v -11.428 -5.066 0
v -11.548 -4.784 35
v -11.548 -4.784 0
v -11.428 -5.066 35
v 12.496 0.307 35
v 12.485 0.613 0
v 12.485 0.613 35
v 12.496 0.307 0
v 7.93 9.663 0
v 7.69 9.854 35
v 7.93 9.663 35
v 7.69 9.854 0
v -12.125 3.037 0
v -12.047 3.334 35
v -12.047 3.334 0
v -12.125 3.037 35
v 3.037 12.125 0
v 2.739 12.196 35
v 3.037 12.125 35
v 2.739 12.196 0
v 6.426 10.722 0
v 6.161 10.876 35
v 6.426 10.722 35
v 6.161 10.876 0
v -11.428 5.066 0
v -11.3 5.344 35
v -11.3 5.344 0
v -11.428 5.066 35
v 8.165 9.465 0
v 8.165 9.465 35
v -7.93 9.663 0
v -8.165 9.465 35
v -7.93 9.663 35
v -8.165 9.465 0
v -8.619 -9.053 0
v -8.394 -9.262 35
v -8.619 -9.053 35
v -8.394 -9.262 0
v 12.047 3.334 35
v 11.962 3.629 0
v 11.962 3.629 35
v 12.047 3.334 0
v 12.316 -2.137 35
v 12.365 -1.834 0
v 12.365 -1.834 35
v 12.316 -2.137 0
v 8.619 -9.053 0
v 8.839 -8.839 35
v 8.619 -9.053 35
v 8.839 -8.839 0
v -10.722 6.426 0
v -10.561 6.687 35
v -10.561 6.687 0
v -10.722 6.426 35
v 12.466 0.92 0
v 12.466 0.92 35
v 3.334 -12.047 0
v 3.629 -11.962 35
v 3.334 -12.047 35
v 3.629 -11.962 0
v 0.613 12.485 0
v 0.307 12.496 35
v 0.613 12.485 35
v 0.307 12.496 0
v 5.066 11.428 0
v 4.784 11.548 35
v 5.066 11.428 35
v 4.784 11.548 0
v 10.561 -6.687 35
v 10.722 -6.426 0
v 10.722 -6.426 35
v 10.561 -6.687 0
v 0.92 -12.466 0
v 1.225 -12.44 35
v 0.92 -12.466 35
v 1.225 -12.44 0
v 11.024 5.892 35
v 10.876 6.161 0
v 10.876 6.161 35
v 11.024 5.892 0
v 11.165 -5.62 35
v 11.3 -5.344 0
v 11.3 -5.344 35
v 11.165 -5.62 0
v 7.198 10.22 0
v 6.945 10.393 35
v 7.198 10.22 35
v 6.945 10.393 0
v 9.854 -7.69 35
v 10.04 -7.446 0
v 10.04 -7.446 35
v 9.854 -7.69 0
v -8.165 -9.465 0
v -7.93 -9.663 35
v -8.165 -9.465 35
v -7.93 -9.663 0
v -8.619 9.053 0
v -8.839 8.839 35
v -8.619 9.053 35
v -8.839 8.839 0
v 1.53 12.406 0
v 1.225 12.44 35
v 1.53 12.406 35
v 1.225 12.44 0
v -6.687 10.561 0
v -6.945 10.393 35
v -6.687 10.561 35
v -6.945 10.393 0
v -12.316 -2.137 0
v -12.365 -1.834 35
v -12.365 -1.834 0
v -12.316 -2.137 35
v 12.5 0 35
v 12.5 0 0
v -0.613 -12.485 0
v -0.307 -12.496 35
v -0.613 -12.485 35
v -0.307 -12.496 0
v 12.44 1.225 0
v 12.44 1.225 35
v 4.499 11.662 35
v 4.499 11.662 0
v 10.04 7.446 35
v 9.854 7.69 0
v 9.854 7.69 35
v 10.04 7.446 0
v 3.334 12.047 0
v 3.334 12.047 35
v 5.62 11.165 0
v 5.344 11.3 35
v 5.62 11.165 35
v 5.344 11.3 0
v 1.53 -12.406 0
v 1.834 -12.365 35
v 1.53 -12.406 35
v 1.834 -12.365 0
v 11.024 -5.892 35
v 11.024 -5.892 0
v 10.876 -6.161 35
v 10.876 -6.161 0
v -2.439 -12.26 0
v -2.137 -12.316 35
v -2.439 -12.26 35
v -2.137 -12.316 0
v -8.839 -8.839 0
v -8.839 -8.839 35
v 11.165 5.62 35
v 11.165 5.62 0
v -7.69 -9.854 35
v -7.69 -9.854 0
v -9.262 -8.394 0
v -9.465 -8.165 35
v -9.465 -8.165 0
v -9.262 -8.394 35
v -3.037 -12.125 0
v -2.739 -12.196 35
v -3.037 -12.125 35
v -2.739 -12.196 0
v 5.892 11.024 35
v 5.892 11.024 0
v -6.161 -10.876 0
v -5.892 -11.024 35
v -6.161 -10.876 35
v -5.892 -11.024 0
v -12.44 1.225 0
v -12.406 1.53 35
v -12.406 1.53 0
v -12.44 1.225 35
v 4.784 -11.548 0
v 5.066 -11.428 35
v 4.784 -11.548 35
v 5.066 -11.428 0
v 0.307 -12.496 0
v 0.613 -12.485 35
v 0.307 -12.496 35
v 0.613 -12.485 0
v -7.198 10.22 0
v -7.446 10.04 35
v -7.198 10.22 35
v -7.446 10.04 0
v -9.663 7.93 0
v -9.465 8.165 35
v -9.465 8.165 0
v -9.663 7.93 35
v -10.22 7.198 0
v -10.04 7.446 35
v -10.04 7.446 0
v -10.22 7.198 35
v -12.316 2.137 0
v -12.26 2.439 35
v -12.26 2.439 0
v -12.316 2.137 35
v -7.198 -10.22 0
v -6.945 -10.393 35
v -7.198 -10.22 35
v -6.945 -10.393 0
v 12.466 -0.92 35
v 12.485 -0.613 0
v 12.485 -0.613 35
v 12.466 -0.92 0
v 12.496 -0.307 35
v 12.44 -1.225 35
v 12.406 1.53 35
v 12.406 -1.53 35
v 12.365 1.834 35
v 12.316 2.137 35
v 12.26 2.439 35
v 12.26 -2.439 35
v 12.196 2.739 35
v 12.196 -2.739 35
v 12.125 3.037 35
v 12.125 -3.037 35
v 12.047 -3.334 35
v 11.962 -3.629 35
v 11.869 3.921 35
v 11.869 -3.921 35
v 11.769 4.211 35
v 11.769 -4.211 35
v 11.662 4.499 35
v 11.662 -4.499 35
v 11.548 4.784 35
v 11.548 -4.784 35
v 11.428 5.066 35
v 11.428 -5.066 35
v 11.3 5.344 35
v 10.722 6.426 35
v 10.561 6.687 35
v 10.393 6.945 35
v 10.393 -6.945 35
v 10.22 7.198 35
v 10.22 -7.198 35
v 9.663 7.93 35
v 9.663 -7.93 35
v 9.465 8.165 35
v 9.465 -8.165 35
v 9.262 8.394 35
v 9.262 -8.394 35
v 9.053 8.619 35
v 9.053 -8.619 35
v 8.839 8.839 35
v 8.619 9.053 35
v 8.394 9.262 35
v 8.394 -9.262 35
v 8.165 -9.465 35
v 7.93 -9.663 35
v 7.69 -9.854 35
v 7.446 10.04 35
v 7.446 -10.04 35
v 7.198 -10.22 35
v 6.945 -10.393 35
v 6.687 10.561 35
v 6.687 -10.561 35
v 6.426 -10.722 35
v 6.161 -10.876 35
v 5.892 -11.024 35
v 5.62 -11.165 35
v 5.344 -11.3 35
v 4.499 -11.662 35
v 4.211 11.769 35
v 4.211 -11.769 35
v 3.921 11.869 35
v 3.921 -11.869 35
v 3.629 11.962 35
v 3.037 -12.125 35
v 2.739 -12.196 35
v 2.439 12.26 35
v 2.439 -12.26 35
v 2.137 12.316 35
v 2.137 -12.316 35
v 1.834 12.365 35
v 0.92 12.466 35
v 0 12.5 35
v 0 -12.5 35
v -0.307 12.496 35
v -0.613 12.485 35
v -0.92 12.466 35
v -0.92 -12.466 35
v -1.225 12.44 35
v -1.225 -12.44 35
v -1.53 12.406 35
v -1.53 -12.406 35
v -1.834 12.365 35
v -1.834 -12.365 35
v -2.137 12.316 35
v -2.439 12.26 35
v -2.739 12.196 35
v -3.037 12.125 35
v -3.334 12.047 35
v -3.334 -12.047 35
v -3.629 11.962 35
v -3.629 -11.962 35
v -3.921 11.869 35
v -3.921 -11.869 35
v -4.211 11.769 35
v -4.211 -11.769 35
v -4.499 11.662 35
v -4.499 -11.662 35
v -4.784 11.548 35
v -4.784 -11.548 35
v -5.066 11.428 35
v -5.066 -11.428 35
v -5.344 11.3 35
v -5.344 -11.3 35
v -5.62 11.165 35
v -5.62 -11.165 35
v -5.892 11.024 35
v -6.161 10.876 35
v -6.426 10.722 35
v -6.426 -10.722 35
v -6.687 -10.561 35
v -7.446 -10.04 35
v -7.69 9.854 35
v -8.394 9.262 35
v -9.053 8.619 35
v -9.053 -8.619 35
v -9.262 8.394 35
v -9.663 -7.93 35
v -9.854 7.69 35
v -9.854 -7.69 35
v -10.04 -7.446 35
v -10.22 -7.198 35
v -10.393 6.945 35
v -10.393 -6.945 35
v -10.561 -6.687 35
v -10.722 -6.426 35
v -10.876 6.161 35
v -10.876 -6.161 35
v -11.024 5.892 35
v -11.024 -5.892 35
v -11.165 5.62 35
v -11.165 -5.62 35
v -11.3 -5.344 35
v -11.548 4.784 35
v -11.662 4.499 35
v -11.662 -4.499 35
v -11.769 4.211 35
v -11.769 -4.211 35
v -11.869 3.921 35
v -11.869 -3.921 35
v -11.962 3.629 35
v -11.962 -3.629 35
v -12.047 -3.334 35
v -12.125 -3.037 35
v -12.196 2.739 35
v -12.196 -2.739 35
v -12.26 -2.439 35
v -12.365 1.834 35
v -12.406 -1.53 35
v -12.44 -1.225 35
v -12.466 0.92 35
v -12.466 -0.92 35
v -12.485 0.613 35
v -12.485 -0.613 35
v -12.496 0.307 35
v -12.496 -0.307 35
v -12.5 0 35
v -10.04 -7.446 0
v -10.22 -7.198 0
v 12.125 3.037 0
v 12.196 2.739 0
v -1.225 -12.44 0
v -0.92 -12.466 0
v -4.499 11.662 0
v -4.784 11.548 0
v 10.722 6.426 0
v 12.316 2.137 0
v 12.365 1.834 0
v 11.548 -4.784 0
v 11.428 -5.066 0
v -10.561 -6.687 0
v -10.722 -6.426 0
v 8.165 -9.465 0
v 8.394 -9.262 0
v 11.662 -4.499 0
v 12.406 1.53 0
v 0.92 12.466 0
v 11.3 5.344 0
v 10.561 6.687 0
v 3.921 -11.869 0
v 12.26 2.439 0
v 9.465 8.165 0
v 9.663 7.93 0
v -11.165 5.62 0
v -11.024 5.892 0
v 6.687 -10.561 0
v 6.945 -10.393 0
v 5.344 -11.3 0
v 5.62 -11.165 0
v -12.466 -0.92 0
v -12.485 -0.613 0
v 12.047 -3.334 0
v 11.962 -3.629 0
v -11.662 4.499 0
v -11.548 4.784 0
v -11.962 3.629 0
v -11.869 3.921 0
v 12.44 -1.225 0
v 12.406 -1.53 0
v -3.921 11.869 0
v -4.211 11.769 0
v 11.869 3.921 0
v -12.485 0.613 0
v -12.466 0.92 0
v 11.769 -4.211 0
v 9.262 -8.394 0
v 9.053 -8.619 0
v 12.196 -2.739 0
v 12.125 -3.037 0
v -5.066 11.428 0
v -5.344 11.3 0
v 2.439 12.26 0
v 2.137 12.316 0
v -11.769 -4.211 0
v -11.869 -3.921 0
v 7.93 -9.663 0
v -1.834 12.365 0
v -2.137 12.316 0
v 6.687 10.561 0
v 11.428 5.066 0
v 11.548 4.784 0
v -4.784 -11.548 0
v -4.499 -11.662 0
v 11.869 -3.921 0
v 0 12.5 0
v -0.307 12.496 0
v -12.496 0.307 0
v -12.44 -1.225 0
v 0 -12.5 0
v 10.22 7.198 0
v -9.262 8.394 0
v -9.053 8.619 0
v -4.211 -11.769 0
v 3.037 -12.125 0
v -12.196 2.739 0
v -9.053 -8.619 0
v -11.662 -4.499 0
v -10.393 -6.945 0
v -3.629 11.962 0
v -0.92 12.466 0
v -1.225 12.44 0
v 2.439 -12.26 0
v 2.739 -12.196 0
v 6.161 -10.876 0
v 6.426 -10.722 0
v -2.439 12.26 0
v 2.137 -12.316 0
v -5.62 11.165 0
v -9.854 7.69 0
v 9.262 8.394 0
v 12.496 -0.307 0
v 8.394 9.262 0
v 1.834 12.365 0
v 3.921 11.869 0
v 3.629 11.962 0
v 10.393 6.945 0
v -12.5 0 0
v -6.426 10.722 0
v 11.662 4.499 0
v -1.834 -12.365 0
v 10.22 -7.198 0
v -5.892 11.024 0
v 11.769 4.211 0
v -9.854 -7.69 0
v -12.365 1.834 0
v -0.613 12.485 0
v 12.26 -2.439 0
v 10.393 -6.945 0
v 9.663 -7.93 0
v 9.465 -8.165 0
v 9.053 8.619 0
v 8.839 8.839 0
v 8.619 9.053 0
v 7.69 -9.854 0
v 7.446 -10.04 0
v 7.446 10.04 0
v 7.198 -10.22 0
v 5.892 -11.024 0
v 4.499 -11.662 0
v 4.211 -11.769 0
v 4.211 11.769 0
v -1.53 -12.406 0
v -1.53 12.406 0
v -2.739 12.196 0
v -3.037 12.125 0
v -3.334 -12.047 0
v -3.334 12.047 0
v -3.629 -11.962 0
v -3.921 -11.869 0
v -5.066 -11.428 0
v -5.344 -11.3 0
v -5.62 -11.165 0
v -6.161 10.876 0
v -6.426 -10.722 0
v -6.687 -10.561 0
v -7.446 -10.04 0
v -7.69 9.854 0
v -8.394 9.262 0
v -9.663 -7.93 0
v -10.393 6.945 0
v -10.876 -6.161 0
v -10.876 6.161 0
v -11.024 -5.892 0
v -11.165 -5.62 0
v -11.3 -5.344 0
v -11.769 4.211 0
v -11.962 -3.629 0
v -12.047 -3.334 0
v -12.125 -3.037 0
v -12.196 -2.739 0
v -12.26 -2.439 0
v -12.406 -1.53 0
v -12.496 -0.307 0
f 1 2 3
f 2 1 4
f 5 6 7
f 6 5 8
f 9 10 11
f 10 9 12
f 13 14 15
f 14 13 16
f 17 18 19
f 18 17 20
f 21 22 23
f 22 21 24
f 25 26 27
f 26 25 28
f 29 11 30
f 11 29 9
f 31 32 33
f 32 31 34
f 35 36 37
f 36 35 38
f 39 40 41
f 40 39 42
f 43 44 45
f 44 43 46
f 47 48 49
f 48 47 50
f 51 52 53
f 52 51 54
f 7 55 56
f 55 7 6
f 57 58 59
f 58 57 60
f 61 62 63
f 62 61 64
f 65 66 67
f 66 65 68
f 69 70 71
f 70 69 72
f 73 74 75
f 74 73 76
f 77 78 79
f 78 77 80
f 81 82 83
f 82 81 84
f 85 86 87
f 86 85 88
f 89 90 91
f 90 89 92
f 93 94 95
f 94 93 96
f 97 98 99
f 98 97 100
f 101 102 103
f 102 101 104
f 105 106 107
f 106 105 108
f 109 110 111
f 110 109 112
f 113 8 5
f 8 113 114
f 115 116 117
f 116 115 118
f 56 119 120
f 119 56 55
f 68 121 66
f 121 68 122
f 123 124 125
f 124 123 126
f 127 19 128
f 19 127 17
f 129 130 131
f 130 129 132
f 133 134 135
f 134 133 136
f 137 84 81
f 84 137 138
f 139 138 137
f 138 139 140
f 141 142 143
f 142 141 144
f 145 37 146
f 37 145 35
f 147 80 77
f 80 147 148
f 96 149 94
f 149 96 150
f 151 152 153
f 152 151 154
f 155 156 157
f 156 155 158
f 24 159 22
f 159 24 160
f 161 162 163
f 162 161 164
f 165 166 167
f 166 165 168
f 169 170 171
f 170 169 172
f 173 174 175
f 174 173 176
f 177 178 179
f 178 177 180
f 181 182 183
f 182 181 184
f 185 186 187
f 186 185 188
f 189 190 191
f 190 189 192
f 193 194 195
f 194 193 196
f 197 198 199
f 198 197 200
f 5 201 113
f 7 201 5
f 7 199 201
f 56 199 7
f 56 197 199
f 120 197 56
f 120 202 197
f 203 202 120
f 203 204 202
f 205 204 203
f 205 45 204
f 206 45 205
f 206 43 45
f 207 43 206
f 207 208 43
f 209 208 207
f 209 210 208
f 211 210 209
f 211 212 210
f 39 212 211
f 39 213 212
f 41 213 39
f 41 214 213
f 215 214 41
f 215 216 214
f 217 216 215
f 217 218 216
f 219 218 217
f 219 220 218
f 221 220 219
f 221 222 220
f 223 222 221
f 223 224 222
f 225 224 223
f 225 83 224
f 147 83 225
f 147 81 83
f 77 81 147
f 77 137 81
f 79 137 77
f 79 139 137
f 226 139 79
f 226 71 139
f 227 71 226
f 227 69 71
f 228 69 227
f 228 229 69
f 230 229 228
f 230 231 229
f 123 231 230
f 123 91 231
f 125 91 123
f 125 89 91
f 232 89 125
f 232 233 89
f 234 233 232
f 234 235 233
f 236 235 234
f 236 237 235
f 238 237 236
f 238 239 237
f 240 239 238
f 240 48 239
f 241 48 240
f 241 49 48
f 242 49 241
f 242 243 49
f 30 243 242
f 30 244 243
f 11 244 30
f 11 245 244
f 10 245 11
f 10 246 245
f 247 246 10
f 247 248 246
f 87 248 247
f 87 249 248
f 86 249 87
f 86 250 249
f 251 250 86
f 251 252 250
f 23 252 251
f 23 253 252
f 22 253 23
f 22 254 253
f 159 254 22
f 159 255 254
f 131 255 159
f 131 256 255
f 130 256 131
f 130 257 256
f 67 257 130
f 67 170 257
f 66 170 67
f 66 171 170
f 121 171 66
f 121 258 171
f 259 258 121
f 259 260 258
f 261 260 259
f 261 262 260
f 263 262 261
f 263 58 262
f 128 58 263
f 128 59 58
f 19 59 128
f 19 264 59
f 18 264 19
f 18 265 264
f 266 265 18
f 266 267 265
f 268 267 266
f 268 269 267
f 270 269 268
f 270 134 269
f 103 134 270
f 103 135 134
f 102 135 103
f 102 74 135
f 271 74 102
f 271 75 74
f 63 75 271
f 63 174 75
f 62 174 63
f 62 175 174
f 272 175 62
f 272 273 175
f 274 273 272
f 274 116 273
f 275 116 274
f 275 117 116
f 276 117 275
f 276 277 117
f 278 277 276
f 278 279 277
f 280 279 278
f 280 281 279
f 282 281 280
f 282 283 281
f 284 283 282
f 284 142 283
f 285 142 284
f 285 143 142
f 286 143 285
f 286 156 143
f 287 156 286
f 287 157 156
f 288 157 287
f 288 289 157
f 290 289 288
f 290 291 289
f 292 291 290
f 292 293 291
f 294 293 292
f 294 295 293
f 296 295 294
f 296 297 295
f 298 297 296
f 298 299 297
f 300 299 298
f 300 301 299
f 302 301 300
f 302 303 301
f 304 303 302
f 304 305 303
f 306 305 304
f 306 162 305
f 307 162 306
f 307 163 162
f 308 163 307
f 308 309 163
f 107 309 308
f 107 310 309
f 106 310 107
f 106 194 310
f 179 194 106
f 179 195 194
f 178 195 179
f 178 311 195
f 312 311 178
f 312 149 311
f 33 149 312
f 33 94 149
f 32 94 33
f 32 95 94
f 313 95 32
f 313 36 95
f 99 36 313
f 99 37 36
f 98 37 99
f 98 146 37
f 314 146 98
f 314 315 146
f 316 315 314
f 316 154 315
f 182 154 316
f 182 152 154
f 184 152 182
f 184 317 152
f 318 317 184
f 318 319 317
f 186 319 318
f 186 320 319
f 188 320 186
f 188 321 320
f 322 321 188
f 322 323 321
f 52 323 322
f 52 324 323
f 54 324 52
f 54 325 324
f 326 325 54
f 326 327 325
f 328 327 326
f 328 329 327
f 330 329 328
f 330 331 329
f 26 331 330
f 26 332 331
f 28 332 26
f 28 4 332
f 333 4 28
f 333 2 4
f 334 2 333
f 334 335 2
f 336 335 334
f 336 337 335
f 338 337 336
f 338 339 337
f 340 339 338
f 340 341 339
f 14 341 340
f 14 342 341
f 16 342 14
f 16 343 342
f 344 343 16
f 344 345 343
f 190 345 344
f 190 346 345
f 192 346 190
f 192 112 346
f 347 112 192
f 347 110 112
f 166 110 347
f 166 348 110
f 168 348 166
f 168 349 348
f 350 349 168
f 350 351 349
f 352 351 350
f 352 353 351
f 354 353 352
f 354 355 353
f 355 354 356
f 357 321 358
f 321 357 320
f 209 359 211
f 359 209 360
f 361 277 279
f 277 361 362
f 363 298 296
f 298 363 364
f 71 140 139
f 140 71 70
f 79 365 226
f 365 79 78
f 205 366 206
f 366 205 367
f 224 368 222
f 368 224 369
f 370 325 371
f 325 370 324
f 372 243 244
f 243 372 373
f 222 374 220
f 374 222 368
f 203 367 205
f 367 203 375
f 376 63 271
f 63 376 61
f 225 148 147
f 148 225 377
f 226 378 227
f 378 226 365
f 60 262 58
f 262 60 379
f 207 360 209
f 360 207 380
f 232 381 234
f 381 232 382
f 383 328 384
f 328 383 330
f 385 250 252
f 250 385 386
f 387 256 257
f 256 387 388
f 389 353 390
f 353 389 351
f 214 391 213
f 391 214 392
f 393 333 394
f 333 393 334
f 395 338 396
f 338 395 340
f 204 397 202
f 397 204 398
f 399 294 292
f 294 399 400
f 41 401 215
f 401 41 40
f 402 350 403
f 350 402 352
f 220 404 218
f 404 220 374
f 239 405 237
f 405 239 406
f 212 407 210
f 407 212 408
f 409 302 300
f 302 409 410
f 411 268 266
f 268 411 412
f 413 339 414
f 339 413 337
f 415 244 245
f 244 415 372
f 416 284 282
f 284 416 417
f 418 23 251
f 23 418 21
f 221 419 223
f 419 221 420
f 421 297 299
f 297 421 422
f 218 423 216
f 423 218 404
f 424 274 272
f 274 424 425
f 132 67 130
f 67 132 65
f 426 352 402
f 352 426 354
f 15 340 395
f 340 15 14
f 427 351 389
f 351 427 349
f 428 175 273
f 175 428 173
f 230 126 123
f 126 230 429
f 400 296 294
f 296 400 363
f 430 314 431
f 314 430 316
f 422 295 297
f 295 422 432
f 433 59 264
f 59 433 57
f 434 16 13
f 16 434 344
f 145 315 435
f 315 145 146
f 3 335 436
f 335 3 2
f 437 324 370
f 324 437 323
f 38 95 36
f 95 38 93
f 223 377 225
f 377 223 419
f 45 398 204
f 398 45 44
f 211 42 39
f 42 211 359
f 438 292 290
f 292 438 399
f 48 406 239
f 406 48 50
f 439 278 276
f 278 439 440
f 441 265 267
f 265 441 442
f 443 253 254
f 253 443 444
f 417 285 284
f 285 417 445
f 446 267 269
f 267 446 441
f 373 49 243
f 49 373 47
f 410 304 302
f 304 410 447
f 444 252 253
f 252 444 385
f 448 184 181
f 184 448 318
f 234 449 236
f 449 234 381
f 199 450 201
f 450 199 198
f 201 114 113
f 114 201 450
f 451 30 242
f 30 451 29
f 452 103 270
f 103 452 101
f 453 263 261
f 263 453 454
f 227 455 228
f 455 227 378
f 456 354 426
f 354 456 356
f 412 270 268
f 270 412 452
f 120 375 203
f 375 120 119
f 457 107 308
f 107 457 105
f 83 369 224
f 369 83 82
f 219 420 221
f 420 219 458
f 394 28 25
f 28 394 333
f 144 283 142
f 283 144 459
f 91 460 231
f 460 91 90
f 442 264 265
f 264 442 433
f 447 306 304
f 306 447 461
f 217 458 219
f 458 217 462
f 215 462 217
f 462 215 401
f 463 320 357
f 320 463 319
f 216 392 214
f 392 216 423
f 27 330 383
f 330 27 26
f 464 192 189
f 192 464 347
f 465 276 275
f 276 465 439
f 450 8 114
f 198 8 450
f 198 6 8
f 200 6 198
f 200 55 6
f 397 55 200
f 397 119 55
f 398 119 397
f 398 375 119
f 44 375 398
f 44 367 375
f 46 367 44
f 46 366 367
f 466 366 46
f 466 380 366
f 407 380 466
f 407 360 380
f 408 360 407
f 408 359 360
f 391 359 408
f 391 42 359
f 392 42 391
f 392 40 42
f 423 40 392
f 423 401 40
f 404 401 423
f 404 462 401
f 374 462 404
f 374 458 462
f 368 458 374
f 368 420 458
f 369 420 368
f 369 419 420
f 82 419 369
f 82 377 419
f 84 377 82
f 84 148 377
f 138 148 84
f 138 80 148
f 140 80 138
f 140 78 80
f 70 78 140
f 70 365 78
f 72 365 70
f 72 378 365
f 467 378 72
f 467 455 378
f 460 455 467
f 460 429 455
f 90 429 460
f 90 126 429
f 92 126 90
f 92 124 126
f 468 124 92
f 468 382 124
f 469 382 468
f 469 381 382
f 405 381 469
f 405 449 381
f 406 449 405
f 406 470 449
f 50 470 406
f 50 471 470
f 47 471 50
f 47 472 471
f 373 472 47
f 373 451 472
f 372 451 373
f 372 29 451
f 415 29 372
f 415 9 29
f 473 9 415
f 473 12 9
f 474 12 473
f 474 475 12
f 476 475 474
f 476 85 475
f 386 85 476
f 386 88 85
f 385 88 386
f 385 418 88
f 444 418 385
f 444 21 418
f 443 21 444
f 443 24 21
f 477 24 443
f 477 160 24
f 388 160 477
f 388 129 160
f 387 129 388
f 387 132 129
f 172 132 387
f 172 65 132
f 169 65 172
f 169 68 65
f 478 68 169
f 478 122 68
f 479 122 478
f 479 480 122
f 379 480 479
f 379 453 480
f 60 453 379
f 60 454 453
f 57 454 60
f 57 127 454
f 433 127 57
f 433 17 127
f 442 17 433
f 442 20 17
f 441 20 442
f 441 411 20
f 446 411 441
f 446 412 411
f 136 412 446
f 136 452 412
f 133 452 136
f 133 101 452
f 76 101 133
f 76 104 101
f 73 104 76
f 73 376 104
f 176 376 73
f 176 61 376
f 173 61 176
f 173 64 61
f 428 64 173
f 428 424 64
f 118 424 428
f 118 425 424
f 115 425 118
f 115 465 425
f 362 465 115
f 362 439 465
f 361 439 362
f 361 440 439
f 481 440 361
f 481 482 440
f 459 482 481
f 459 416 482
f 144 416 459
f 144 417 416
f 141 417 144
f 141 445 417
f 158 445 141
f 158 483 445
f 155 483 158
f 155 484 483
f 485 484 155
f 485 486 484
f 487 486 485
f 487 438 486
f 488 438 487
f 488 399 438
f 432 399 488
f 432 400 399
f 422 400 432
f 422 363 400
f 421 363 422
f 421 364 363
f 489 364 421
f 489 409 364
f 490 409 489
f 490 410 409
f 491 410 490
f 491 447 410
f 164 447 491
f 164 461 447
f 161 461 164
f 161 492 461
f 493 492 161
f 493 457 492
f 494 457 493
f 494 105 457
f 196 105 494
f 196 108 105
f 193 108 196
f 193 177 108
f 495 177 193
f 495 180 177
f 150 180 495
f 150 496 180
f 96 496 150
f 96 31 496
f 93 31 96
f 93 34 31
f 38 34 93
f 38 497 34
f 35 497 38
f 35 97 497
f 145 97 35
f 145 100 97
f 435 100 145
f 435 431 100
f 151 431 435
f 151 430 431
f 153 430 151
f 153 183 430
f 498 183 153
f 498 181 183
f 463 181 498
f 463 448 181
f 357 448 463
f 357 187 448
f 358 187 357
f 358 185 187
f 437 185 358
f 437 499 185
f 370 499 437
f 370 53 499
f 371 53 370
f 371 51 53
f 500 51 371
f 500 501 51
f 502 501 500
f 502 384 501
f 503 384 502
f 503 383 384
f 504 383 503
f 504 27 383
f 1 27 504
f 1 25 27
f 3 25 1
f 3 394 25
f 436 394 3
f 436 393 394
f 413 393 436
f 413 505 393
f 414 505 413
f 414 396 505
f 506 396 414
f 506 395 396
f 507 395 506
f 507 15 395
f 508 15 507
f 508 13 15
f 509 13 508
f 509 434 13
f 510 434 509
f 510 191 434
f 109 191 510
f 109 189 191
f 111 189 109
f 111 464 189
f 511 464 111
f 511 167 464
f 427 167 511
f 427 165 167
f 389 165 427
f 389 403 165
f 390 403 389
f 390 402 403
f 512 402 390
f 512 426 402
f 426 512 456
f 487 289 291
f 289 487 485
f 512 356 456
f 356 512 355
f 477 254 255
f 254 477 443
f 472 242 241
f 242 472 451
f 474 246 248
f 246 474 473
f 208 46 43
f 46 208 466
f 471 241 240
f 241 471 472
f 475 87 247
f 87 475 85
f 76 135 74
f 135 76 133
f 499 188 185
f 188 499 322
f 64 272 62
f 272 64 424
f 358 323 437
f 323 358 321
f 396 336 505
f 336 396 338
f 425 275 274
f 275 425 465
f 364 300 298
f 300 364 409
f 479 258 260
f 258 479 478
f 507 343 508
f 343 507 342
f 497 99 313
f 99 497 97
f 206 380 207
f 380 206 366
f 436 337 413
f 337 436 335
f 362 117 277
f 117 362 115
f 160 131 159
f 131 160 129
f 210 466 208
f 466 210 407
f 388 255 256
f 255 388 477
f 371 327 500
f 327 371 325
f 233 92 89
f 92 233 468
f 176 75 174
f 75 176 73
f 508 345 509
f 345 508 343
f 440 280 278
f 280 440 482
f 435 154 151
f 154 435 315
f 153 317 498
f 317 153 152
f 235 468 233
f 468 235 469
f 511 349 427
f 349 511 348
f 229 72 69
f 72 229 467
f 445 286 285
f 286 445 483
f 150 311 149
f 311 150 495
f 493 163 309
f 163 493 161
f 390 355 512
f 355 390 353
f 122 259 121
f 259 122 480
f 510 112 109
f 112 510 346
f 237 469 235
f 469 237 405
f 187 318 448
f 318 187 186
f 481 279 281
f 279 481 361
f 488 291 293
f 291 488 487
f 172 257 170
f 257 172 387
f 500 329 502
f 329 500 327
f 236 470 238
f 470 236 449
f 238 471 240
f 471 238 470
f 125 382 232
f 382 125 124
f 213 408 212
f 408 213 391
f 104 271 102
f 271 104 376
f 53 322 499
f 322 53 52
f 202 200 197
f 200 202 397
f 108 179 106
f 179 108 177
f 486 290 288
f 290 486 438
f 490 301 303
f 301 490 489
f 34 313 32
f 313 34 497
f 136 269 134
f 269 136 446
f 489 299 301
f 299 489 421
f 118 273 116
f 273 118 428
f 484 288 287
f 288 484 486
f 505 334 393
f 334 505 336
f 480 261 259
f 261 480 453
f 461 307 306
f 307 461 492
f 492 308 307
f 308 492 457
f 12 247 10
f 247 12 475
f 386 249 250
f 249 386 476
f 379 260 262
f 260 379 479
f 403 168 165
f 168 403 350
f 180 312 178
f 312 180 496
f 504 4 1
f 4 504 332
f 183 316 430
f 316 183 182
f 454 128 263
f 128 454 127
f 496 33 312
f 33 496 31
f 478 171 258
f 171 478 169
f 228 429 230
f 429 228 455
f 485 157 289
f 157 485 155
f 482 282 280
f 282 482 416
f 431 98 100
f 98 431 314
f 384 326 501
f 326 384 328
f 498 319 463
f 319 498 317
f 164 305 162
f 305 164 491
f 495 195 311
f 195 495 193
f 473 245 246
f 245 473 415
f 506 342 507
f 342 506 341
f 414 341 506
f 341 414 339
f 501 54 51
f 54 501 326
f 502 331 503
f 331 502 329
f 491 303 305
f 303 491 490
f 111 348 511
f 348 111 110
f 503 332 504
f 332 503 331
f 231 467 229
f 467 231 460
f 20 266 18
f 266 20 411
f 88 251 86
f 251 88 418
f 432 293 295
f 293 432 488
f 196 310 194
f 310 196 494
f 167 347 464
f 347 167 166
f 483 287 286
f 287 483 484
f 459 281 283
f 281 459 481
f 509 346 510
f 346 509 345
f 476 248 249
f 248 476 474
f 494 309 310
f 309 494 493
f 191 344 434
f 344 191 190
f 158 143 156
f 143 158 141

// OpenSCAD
// All measurements in MM
// Inner diameter
ind =0;

// Outer diameter bottom
od1=25;

// Outer diameter top 
od2=25;

// Cylinder hight 
ch=35;

// Facets (increase number for smoother outside)
fct=256;

translate([0, 0, 0]) {
    difference() {
		translate([0, 0, 0]) cylinder(h = ch, r1 =od1/2,r2=od2/2,$fn=fct);  //cylinder
		translate([0, 0, 0]) cylinder(h = ch, r= ind/2, $fn=fct);               
    }
}
